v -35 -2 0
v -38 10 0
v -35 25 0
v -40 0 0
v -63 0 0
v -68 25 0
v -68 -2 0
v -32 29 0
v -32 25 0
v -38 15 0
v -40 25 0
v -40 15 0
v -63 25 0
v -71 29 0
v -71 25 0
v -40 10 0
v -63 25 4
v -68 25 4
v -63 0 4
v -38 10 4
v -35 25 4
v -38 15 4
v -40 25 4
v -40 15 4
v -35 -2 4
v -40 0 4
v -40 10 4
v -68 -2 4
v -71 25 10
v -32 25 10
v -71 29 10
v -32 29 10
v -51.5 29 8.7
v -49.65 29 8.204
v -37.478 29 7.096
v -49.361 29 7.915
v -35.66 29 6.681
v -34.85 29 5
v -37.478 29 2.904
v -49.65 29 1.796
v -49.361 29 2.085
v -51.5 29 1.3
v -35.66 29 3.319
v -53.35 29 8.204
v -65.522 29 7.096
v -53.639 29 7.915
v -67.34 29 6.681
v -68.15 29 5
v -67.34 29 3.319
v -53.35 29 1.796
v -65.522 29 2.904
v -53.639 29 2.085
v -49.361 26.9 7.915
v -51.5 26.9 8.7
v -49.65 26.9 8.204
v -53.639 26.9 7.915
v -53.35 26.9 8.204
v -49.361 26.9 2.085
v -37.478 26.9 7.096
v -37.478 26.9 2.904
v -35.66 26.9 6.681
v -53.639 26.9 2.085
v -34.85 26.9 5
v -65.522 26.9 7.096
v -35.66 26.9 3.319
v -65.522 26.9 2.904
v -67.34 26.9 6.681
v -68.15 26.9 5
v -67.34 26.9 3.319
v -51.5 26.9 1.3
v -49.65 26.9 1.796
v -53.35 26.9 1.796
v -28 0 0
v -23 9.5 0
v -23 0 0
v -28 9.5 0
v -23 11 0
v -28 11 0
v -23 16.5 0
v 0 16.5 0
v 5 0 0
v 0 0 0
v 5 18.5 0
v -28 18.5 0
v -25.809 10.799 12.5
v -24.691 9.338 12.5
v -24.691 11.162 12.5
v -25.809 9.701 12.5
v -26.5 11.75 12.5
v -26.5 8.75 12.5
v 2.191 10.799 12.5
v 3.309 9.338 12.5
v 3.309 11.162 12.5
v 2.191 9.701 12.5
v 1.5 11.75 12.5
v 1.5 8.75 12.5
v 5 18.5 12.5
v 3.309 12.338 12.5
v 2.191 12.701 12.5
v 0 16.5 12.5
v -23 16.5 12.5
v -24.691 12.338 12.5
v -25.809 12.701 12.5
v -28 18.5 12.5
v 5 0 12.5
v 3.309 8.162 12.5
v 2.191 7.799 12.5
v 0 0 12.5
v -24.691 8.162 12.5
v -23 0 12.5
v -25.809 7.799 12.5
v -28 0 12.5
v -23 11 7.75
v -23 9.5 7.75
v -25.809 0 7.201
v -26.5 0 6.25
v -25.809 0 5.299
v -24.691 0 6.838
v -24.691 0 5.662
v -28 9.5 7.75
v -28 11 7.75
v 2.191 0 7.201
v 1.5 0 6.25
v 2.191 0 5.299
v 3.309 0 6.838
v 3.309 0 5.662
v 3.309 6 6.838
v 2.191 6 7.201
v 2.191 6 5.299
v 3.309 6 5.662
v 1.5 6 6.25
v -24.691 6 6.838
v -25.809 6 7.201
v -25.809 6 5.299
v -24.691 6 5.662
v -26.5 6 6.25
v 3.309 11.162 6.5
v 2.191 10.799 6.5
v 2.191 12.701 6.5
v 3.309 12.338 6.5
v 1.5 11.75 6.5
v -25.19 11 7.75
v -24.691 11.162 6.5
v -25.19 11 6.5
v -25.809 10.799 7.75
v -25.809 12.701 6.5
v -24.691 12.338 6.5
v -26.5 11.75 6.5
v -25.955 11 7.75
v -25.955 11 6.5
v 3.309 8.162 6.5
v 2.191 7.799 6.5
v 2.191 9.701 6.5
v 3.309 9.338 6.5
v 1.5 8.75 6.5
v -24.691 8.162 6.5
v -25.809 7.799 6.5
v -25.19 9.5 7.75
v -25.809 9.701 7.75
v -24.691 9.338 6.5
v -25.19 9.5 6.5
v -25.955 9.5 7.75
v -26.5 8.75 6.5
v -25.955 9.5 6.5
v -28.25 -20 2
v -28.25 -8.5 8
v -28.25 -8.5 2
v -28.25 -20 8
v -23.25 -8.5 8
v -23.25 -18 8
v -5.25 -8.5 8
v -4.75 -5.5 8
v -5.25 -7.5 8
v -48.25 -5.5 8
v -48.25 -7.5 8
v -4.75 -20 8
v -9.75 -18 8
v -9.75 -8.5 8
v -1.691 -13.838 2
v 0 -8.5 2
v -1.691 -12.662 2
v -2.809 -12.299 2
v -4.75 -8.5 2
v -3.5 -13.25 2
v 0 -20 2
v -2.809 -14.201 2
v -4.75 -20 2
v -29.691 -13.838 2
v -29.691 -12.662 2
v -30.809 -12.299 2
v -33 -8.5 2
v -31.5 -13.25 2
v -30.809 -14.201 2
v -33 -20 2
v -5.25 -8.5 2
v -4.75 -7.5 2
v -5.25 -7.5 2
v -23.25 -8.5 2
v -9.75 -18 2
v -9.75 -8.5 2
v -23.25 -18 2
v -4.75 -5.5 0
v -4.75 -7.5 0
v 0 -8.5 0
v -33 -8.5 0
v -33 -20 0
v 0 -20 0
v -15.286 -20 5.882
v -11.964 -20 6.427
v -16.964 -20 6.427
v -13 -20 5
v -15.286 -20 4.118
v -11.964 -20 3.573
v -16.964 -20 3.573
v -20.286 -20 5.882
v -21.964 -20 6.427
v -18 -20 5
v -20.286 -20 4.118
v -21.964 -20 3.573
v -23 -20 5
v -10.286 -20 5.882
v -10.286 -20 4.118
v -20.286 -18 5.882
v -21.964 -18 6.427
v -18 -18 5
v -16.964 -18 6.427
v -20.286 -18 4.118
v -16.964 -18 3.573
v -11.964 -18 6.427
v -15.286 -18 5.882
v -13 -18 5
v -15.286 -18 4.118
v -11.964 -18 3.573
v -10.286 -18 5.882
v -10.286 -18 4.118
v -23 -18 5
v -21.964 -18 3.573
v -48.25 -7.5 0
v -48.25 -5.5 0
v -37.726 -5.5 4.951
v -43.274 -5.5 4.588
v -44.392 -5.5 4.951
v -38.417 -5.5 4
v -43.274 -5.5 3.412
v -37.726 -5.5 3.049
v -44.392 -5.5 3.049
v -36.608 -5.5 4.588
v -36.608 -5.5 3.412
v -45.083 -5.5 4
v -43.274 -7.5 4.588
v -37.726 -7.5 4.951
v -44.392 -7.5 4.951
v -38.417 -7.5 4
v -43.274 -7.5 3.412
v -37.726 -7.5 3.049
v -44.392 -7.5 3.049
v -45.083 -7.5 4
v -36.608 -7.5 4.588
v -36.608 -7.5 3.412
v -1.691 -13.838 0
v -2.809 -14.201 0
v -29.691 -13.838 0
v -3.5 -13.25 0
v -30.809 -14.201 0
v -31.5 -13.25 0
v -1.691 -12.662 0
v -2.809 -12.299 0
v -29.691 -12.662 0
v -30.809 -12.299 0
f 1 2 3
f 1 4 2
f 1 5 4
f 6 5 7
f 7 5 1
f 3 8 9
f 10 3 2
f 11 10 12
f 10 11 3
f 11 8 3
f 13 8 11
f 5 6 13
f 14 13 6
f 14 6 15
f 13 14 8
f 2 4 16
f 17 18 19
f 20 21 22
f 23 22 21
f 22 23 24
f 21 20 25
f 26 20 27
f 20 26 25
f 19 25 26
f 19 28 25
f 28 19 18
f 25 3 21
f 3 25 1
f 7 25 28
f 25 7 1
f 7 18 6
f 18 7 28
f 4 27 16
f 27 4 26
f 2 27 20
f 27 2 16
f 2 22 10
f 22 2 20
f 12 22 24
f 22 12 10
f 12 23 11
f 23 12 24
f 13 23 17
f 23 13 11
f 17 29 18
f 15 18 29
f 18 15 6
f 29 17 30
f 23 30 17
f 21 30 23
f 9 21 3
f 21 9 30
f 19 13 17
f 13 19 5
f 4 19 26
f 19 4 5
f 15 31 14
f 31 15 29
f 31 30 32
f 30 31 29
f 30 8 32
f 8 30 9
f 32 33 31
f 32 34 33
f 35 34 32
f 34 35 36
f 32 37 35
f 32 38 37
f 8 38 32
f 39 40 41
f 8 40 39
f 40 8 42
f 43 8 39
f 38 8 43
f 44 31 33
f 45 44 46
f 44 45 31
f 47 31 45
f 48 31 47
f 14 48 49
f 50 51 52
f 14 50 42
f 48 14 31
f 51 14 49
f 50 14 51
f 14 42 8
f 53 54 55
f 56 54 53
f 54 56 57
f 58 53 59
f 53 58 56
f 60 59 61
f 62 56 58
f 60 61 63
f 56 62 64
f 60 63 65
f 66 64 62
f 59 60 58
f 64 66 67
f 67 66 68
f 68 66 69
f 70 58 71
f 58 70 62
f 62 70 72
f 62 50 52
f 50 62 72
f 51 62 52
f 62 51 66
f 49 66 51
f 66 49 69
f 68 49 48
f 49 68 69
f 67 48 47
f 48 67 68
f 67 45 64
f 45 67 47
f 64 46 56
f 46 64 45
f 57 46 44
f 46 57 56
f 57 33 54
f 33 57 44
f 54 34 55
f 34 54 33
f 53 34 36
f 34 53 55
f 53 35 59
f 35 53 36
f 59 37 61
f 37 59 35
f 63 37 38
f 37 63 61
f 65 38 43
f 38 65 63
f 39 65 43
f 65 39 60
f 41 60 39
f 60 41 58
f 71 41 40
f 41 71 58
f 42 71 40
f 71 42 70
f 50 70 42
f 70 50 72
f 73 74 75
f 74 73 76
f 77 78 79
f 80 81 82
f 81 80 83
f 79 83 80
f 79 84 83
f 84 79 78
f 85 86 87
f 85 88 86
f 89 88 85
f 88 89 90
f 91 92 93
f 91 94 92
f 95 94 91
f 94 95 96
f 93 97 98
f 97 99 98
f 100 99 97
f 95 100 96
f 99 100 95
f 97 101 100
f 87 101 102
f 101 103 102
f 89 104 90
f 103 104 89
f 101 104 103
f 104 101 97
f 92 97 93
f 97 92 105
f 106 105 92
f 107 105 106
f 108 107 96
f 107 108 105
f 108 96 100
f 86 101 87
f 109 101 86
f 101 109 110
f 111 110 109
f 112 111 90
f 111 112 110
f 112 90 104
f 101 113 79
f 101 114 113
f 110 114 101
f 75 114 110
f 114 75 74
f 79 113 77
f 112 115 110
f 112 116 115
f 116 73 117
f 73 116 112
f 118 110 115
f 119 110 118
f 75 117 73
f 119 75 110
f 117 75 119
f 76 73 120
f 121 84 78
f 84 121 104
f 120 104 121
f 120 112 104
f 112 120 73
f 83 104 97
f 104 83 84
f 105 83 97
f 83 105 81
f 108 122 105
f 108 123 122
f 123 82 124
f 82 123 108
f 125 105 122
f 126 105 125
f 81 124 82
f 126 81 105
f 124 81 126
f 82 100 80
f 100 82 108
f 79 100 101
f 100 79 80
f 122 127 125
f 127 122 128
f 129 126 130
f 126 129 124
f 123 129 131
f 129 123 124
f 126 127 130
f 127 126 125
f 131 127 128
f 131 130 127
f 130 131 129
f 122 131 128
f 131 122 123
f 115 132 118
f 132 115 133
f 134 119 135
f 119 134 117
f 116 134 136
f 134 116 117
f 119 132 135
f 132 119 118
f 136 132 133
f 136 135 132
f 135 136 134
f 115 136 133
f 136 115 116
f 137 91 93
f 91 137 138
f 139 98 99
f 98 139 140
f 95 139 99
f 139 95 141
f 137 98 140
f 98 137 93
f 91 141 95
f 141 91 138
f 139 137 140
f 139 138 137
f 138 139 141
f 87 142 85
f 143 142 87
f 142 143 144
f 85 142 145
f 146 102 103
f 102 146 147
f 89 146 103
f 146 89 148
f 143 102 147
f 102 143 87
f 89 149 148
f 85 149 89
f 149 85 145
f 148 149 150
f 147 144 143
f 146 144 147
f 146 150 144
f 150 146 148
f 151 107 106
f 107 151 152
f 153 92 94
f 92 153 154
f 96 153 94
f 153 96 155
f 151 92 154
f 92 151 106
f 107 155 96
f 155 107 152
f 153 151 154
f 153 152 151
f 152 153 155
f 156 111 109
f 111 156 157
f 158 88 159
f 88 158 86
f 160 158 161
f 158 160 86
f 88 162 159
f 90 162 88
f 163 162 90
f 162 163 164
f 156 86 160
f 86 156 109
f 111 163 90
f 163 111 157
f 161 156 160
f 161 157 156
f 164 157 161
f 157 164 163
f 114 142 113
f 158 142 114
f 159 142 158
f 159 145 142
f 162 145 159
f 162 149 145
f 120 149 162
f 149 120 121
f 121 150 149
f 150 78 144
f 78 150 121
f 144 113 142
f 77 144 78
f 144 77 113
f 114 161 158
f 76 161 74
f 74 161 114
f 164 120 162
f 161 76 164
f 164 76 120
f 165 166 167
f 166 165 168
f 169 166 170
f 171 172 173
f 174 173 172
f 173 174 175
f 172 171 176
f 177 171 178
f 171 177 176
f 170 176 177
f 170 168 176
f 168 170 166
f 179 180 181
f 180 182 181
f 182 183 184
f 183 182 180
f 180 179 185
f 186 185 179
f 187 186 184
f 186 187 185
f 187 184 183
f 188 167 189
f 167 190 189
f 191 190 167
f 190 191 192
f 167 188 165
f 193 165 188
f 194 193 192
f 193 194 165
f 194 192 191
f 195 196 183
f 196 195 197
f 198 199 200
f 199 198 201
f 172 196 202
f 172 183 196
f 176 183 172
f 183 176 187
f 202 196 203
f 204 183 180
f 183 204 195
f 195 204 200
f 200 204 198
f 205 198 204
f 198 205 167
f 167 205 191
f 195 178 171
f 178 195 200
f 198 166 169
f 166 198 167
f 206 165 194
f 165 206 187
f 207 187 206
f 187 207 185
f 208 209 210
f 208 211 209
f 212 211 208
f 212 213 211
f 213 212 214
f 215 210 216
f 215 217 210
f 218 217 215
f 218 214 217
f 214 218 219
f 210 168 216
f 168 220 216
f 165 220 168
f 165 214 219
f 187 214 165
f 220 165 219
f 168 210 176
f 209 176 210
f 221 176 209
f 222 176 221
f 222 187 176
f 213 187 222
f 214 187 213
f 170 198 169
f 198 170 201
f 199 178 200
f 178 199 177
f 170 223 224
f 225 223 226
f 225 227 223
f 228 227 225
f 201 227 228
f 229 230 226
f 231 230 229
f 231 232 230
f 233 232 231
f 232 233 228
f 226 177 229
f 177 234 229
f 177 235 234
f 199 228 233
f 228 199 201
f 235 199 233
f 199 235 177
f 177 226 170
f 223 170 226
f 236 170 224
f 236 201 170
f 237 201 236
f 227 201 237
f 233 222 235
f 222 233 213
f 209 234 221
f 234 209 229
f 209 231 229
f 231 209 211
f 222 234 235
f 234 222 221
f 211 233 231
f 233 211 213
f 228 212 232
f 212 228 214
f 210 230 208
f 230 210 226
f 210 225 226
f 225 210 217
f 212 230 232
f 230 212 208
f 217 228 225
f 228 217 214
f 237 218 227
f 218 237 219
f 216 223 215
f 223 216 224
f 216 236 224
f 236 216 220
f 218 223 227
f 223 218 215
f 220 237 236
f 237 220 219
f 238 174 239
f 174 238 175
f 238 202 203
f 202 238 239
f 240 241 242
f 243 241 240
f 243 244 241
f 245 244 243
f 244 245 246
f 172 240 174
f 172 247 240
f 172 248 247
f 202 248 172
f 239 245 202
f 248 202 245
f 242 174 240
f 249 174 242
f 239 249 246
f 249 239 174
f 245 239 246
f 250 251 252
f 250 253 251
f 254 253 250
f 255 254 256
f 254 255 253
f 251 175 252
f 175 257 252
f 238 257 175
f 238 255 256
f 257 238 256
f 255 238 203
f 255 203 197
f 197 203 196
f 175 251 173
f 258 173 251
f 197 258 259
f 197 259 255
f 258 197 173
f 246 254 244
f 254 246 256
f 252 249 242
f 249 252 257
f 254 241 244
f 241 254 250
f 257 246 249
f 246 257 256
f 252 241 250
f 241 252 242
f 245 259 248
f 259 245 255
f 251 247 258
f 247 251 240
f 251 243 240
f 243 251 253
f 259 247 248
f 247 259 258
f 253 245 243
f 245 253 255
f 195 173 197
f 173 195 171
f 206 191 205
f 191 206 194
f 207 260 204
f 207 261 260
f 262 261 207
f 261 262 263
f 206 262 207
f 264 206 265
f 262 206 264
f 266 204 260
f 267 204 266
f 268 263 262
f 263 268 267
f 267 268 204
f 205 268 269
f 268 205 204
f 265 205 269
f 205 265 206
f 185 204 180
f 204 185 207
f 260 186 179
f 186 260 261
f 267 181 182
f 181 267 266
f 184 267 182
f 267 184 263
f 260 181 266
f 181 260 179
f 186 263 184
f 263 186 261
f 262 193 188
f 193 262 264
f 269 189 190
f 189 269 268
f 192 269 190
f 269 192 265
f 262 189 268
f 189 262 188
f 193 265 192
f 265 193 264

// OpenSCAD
// file: spider.scad
screwD = 2; // Diameter of screw holes.
washerD=3; // Diameter of washer holes.
slackD=0.4; // Difference in diameter of pegs and holes
slack=0.2; // Extra height of pegs compared to holes.
horn=2.2; // Depth of the horn attachment.

edge = 5; // Thickness of the edges
bar = 2; // Thickness of the bar


hinge = 0.5; // Thickness of the flexible hinge (must be very thin!)
gap = 1; // The gap between the two hinged parts.
back = 2; // Thickness of the backing for the switch holder
wing = 5; // Size of the wing attachments for the servo motors

// Size of the void to hold the
switchX = 13.5;
switchY = 9.5;
switchZ = 6;

// Length of the overhang, where the switch holder attaches to the main body.
overhang = 20;

// Size of the hole for a servo motor.
w = 23;
l = 16.5;
h = 12.5;


// "end" Constants passes to strut module
FOOT=0;
PEG=1;
HOLE=2;
ATTACHMENT=3;

capThickness=2;
surround=3; // Thickness of plastic around the pegs.

module spokeProfile(slack=0.3)
{
    hull() {
        circle( d=6 +slack );
        translate([14.5,0]) circle( d=4+slack );
    }
    circle( d=7 + slackD );
}


module attachment( thickness, depth=horn )
{
    translate([0,0,thickness-depth]) linear_extrude( thickness ) spokeProfile();
}

module doubleAttachment( depth=horn )
{   
    linear_extrude( depth ) {
        spokeProfile();
        mirror( [1,0] ) spokeProfile();
    }
}

module hole(d)
{
    cylinder( d=d, h=20, center=true );
}


module length( l, w=4.5, curve=0 )
{
    if (curve == 0) {
        hull() {
            circle( d=w );
            translate( [l, 0] ) circle( d=w );
        }
    } else {
        intersection() {
            translate([l/2,-sqrt( curve*curve/4 - l*l/4 ) ])
            difference() {
                circle( d=curve+w, $fa=5 );
                circle( d=curve-w, $fa=5 );
            }
            // Cut out just the segment of the circle we need.
            translate( [l/2, -l/2] ) rotate( 45 ) square( [curve,curve] );
        }
    }
}
// main file
include <spider.scad>;

module legMotors( thickness=4 )
{
    w = 23;
    h = 12.5;
    l = 16.5;
    edge = 5;
    bar = 2;
    
    big = 10;
    top = 4;

    //translate([0,0,h*2+bar*2]) rotate([-90,0,0]) 
    difference( convexity=10 ) {
        union(convexity=10 ) {
            linear_extrude( thickness, convexity=10  ) {
                difference() {
                    translate( [-edge, -bar] ) square( [ w+ edge * 2, h*2 + bar * 2 ] );
                    square( [ w, h*2 ] );
                    
                    translate( [-2.5,h/2] ) hole();
                    translate( [-2.5,h/2*3] ) hole();
                    translate( [w+2.5,h/2] ) hole();
                    translate( [w+2.5,h/2*3] ) hole();
                    translate( [-2,h-2.5] ) square( [3,5]); // Slot for wires
                }
            }

            translate([-8,h*2,0]) cube( [ w+16, top, big ] );
        }
        
        translate( [w/2,h*2 + top + .1, big/2] ) rotate([90,0,0]) doubleAttachment();
    }

}

module switchHolder()
{

    module legHole() 
    {
        translate([0,10,0]) rotate([90,0,0]) cylinder( d=3, h=20 );
    }
    
    translate( [(w-switchX)/2,0,back] ) {
        difference() {
            cube( [switchX+edge*2,switchY+bar,switchZ] );
            translate( [edge,bar,-1] ) cube( [switchX, switchY+1, switchZ+2] );
            
            // Holes for the switch's pins.
            translate( [edge+switchX/2-5,0,switchZ/2] ) legHole();
            translate( [edge+switchX/2,0,switchZ/2] ) legHole();
            translate( [edge+switchX/2+5,0,switchZ/2] ) legHole();
        }
        
        // Thin hinge flap
        cube([hinge,switchY+bar+3,switchZ]);
        
        // Overhang, which will attach to the body
        translate( [0, bar+switchY+gap,-back] ) difference() {
            cube([overhang+switchX+edge*2,bar,switchZ+back]);

            // Screw holes to attach to the main body
            translate([switchX + edge*5/2 + overhang*2/3, bar+1, (switchZ+back)/2]) rotate([90,0,0]) cylinder( d=screwD, h=bar+2 );
            translate([switchX + edge*5/2 + overhang/3, bar+1, (switchZ+back)/2]) rotate([90,0,0]) cylinder( d=screwD, h=bar+2 );
        }

    }

    difference() {               
        // Backing plate
        cube([w+edge*2,switchY+bar,back]);

        translate([edge/2,switchY/2+bar,-1]) cylinder( d=screwD, h=back+2 );
        translate([w+edge/2+edge,switchY/2+bar,-1]) cylinder( d=screwD, h=back+2 );
    }
}

module shoulder()
{
    difference() {
        union() {
            linear_extrude( h,convexity=10 ) {
                difference() {
                    translate( [-edge,0] ) square( [w + edge*2, l+bar] );
                    square( [w,l] );
                }
            }
            translate( [-wing,0,0] ) cube( [wing,6,h] );
            translate( [w,0,0] ) cube( [wing,6,h] );
        }
        // Holes to attach the motor
        translate( [-wing/2,0,h/2] ) rotate([-90,0,0]) cylinder( d=screwD, h=6 );
        translate( [w+wing/2,0,h/2] ) rotate([-90,0,0]) cylinder( d=screwD, h=6 );

        // Holes to attach the switch holder
        translate( [-edge/2,l-switchY/2,h-6] ) cylinder( d=screwD, h=10 );
        translate( [w+edge/2,l-switchY/2,h-6] ) cylinder( d=screwD, h=10 );

        // Alternate Holes to attach the switch holder
        translate( [-edge/2,l-switchY/2-bar-gap,h-6] ) cylinder( d=screwD, h=10 );
        translate( [w+edge/2,l-switchY/2-bar-gap,h-6] ) cylinder( d=screwD, h=10 );
        
        // Slot for the motor's wires
        translate( [w,9.5,-1] ) cube( [edge,1.5,h/2+2.5] );
    }
    

}

module shoulderPieces()
{
    translate( [40,0,0] ) legMotors();
    shoulder();
    translate([0,-20,0]) switchHolder();
}

//shoulderPieces();
mirror( [1,0,0] ) shoulderPieces();
